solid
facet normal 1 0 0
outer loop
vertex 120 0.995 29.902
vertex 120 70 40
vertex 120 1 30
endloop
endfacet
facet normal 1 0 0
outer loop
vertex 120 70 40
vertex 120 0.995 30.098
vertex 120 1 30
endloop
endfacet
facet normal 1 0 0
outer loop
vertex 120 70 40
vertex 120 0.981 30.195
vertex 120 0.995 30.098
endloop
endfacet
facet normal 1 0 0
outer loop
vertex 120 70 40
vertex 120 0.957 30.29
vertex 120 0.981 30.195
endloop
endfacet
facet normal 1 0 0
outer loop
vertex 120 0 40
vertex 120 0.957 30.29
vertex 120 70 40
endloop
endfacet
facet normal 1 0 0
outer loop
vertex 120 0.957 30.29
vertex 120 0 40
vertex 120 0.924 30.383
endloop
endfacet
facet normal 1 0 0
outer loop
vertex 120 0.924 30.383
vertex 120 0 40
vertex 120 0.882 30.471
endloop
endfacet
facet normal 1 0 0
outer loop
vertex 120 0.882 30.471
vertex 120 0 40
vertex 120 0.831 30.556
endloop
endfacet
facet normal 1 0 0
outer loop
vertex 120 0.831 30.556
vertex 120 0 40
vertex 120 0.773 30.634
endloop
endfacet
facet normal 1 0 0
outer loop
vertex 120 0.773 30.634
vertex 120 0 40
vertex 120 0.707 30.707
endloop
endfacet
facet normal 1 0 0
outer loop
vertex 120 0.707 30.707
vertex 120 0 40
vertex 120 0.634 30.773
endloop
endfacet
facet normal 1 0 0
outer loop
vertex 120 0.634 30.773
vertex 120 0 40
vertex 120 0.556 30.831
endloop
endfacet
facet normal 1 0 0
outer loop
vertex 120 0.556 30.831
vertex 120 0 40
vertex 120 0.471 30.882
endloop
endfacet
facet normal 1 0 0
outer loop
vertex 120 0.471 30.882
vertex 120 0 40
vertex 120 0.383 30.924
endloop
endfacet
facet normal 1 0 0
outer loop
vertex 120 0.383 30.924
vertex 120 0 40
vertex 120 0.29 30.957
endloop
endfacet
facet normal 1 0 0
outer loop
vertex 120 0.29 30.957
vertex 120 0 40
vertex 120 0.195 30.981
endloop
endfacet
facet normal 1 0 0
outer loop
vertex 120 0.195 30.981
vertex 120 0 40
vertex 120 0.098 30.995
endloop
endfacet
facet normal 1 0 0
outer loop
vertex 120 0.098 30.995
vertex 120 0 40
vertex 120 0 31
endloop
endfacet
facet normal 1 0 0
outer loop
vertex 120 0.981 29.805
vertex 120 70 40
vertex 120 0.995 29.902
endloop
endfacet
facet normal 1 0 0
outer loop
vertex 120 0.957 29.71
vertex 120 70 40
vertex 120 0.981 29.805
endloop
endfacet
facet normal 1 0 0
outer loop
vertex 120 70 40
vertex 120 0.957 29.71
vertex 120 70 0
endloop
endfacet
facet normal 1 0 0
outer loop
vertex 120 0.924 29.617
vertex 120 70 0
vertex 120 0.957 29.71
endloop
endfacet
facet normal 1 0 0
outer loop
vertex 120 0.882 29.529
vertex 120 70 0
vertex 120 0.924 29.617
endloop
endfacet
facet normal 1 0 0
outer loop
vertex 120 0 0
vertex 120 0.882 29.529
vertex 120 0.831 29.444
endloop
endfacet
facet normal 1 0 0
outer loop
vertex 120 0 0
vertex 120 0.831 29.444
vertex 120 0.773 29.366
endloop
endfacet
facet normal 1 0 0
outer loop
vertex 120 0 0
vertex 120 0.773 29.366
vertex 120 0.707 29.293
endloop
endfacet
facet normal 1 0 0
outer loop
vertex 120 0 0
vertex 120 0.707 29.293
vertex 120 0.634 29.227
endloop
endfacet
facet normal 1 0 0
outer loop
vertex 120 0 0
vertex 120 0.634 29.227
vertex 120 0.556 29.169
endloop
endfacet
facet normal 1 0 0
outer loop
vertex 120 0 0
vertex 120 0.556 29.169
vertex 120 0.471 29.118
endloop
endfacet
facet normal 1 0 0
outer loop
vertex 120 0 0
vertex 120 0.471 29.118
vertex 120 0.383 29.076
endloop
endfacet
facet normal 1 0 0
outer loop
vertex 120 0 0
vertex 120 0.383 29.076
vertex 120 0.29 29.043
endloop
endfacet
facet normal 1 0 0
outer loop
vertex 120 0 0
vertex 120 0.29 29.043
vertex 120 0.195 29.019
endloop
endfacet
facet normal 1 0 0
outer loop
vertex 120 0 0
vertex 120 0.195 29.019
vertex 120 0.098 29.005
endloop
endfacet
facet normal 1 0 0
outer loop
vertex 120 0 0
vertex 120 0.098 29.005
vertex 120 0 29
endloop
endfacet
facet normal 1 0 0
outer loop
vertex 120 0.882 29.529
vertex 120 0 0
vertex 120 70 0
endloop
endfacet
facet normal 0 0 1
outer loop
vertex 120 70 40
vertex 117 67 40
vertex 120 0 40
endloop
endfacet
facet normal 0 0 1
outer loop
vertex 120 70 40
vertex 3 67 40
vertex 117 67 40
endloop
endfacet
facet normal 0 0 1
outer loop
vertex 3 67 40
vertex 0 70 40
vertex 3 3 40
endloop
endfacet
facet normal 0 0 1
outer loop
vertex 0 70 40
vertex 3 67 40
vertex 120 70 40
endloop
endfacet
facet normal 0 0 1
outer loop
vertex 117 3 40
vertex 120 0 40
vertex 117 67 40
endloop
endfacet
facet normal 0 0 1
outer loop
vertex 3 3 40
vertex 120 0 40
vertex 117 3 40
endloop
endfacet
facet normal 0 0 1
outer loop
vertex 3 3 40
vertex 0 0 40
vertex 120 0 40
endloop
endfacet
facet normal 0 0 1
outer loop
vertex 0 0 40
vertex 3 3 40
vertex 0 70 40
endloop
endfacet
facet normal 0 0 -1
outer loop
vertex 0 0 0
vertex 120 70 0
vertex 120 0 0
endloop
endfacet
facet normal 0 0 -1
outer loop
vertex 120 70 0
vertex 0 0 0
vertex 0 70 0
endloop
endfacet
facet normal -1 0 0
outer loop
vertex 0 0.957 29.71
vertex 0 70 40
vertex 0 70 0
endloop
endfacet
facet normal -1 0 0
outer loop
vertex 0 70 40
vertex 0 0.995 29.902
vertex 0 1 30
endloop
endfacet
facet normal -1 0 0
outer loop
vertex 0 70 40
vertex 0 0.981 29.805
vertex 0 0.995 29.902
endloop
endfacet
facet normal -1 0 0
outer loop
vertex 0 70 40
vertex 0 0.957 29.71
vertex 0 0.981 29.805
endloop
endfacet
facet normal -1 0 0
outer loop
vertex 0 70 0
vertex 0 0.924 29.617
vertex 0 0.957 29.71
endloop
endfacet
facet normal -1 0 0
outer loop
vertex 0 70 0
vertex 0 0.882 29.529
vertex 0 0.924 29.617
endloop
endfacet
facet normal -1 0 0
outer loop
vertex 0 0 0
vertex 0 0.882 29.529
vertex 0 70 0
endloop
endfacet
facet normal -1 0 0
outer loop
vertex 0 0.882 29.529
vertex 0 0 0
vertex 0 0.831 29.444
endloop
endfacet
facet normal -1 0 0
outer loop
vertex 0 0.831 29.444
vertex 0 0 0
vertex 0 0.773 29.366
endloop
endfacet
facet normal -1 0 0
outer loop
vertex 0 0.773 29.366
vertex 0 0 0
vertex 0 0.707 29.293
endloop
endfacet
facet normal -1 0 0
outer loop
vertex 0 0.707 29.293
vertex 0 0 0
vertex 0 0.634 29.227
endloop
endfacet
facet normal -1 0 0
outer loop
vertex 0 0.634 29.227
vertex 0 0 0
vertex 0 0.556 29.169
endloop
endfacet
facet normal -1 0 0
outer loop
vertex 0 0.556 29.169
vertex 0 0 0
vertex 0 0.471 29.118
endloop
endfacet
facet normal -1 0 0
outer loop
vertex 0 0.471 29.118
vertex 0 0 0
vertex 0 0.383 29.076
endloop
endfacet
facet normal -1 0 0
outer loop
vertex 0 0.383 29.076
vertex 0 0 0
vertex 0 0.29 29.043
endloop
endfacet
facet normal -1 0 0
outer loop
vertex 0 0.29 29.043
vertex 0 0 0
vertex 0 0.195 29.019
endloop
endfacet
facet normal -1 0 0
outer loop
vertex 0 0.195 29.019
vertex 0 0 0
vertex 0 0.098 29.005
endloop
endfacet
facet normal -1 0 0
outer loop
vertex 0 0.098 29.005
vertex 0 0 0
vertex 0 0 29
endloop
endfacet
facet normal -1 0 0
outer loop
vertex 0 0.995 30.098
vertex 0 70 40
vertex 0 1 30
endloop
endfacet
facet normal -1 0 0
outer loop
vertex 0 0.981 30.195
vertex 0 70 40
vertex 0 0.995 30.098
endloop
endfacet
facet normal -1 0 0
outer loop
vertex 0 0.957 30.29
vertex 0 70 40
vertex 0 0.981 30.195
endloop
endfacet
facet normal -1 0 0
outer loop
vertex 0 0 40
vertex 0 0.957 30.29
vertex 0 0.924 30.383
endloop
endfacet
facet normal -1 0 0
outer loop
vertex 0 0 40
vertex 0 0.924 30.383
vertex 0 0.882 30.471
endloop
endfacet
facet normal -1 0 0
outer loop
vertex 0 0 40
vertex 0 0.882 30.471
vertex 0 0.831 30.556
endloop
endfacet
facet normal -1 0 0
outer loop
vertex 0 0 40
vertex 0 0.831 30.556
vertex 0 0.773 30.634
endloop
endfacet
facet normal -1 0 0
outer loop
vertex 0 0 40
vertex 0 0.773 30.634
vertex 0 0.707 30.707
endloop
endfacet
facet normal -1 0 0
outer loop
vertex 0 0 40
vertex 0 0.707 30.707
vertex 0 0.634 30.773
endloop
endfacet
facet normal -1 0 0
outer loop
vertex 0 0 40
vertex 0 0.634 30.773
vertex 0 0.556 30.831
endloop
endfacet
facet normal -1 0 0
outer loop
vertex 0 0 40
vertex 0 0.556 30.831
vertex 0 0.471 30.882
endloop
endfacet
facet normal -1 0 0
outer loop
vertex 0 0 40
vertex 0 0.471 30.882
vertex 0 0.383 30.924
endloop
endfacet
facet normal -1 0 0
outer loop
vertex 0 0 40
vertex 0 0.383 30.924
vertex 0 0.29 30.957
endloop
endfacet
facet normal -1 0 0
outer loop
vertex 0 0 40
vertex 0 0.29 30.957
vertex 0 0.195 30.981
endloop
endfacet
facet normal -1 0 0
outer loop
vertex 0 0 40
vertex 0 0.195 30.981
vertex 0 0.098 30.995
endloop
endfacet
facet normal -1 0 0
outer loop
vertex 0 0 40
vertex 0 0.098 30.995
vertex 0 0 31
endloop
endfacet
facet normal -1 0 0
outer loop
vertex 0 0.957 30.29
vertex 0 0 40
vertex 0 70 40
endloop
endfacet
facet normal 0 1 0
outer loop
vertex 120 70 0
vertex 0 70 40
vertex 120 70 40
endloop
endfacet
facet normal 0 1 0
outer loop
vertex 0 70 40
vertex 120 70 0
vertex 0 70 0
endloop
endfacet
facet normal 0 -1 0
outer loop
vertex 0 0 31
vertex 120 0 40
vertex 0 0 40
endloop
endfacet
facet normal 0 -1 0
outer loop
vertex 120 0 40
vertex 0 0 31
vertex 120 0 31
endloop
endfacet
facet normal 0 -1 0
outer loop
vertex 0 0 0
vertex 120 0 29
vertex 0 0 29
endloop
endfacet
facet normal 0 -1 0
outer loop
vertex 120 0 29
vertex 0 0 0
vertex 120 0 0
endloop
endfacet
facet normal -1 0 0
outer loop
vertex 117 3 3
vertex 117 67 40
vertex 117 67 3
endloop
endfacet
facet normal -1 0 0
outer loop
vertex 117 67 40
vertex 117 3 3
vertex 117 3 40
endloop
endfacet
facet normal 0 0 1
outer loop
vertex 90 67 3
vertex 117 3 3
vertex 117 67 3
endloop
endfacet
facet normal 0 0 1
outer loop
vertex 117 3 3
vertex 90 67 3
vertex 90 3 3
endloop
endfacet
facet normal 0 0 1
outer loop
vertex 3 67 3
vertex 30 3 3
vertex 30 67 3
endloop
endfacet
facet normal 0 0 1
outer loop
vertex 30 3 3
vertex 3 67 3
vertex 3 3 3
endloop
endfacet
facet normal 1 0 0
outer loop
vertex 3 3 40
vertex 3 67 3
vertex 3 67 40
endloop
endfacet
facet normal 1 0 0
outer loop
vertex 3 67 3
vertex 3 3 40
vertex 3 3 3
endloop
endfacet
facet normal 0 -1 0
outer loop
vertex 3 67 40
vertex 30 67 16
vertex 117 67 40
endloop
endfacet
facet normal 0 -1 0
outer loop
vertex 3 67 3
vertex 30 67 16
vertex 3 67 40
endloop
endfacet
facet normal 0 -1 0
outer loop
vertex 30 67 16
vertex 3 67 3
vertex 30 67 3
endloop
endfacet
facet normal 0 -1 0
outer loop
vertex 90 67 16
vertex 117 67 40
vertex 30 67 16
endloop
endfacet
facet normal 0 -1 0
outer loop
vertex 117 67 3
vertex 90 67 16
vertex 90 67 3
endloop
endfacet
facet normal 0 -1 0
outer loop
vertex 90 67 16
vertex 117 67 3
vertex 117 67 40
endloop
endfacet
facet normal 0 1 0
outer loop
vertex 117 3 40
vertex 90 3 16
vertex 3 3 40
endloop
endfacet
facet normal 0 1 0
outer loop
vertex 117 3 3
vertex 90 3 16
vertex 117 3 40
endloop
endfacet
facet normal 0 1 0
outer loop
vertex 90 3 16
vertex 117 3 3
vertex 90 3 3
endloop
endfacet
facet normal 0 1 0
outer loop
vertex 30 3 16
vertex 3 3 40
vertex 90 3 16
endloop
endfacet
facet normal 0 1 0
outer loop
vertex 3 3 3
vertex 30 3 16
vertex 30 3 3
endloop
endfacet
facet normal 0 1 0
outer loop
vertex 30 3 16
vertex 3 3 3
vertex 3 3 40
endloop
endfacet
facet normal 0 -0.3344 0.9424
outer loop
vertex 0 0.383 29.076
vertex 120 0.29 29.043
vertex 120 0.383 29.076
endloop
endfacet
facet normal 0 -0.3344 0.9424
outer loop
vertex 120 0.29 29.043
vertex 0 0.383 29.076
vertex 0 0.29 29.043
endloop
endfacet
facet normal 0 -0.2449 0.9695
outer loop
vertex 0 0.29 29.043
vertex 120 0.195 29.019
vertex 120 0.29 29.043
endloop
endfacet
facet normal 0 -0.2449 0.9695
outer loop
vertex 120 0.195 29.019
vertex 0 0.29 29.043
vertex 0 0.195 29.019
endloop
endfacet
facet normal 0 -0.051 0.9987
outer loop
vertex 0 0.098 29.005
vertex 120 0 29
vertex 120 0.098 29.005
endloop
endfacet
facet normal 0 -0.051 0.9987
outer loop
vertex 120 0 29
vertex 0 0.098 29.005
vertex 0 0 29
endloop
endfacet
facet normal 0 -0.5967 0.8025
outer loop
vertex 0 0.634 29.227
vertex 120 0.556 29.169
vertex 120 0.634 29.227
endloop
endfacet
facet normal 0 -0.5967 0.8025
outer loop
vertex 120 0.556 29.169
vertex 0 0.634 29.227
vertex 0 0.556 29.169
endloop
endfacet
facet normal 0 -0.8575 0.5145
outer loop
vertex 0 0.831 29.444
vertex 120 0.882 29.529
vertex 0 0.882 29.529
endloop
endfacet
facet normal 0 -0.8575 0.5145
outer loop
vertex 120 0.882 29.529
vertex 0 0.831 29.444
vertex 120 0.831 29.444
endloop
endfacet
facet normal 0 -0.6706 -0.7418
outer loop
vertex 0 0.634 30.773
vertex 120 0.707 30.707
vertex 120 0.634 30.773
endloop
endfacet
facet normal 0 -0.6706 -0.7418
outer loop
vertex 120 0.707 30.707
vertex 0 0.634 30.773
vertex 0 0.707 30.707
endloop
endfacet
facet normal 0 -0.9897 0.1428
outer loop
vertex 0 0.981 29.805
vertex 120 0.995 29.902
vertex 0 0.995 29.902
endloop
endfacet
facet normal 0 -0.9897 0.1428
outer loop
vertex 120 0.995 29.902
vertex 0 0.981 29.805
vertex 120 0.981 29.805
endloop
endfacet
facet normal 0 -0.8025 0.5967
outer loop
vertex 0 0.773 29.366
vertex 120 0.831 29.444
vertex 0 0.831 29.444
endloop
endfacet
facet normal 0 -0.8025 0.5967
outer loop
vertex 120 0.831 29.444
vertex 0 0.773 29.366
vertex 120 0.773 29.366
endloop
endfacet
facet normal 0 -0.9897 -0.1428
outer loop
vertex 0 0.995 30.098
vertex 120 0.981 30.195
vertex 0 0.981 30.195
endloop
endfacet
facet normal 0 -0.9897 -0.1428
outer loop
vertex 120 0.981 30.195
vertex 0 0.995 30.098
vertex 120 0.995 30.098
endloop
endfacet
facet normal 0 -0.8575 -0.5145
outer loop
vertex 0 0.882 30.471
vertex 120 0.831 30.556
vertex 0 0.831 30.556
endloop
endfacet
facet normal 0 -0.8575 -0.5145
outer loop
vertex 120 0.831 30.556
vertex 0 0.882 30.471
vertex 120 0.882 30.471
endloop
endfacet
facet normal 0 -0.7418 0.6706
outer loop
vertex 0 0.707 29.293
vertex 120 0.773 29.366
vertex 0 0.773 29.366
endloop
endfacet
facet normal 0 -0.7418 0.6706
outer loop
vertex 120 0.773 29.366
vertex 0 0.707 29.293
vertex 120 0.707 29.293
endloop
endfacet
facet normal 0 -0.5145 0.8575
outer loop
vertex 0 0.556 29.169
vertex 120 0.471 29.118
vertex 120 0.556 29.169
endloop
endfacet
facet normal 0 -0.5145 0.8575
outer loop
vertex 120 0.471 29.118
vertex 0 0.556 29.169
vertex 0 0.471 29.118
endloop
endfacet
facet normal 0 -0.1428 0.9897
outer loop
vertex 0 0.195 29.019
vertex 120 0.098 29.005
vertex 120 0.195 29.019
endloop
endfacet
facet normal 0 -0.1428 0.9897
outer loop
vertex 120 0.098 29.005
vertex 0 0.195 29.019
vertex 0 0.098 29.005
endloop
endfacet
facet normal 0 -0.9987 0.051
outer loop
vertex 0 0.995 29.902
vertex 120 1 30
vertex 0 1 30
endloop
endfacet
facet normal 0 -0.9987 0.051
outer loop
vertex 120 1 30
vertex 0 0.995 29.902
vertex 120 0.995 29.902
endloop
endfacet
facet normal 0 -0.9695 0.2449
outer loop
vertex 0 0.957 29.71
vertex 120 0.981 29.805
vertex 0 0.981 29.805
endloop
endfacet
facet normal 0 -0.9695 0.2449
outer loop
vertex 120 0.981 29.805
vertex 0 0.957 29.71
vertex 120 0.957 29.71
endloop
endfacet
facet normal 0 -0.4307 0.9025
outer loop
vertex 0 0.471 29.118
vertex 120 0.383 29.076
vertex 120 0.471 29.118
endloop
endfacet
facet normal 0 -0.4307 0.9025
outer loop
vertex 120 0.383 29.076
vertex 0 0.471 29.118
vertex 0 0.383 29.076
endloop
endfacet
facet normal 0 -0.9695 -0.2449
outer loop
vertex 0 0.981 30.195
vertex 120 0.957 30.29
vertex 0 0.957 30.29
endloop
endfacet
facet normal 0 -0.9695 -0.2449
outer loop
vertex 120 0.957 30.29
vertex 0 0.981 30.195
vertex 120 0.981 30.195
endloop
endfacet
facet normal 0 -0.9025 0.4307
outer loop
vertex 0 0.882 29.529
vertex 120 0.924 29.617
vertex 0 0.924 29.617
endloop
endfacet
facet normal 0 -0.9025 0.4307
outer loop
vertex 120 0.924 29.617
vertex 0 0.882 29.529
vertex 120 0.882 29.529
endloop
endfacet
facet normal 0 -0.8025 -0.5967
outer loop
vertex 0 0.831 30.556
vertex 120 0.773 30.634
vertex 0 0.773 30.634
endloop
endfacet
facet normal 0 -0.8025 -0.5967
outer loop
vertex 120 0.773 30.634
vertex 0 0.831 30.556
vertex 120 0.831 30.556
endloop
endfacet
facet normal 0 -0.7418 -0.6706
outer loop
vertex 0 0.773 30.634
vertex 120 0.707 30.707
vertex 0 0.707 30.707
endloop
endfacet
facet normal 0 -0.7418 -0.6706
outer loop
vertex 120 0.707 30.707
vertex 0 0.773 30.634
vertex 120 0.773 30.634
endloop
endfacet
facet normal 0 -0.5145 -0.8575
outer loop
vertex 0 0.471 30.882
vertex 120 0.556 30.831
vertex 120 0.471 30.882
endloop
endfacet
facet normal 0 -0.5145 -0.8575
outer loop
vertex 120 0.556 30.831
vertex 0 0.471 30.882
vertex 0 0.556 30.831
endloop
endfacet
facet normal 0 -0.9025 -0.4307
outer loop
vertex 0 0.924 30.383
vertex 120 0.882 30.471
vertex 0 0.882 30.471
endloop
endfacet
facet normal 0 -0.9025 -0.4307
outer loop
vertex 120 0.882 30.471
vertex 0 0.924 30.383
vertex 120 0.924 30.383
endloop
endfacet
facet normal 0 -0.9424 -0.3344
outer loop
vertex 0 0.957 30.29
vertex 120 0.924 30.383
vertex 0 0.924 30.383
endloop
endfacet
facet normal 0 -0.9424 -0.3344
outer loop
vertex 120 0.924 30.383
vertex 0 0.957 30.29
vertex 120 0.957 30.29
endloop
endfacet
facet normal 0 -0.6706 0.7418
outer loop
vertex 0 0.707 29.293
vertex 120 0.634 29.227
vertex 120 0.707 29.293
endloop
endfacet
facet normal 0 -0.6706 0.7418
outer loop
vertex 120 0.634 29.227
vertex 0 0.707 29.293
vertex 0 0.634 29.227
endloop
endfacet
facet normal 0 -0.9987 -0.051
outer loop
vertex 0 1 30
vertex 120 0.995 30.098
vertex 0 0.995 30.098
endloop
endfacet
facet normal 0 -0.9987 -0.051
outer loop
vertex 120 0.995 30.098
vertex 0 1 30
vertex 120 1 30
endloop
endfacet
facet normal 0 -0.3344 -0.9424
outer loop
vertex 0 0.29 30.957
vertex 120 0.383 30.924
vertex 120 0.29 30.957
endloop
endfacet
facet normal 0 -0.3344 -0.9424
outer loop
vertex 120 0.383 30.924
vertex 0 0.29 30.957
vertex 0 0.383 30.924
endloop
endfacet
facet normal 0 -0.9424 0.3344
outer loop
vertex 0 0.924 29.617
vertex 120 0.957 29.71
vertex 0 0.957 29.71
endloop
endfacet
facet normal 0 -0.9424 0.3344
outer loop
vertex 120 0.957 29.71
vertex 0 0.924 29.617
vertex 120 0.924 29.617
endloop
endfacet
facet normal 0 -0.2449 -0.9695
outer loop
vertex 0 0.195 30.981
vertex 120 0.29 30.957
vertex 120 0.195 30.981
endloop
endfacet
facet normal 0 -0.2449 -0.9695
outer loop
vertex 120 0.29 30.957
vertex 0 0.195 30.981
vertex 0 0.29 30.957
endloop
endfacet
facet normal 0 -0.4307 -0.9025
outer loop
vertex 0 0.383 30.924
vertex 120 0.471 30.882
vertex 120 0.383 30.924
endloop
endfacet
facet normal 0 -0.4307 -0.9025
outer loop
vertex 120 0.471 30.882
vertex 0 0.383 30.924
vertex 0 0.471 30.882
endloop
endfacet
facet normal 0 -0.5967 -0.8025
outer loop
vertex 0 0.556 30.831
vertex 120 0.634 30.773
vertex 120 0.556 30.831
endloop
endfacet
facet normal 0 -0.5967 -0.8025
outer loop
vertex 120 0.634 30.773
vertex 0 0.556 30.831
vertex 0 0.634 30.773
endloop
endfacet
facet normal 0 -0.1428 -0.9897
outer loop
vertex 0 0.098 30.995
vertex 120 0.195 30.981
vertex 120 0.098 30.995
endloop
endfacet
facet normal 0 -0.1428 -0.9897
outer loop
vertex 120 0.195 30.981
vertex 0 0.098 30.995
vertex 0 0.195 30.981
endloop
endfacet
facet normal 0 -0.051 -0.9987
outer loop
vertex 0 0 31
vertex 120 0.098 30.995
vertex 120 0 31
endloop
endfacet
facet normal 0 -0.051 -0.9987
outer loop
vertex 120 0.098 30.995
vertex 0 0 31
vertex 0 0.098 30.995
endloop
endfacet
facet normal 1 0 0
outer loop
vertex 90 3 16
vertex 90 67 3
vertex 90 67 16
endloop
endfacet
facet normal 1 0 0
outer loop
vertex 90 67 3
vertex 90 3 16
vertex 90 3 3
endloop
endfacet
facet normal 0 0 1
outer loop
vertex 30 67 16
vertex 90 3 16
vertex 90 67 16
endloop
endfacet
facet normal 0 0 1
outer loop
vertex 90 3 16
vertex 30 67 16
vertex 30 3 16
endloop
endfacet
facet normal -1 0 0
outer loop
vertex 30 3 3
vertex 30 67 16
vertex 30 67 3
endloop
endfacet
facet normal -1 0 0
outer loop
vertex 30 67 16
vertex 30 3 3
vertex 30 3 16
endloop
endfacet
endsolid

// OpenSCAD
// --- Parameters ---
// Outer dimensions of the tank
outer_x = 120; // Length of the tank (X)
outer_y = 70;  // Width of the tank (Y)
outer_z = 40;  // Height of the tank (Z)

// Wall and floor thickness
wall_thickness = 3; 
floor_thickness = 3;

// Platform dimensions
platform_length = 60; // Length of the platform along X
platform_height_from_inner_floor = 10; // Height of platform top relative to inner floor

// Electrode holes
hole_diameter = 2;
hole_y_pos = 0; // Y position of the hole center
hole_z_pos = 30; // Z position of the hole center

// Resolution
$fn = 64;

// --- Calculations ---
inner_x = outer_x - (2 * wall_thickness);
inner_y = outer_y - (2 * wall_thickness);
inner_z = outer_z - floor_thickness;

// The platform top is 10mm above the inner floor.
// Inner floor is at z = floor_thickness.
platform_top_z = floor_thickness + platform_height_from_inner_floor;

// --- Modeling ---

module buffer_tank() {
    difference() {
        // Main Body
        cube([outer_x, outer_y, outer_z]);

        // Hollow out the tank
        translate([wall_thickness, wall_thickness, floor_thickness])
            cube([inner_x, inner_y, outer_z]);

        // Electrode holes (drilled through the X-end walls)
        // We use a cylinder oriented along X. 
        // To ensure clean cuts, we make the cylinder longer than the tank.
        translate([-1, hole_y_pos, hole_z_pos])
            rotate([0, 90, 0])
                cylinder(d = hole_diameter, h = outer_x + 2);
    }

    // The Platform
    // It spans the full inner width (Y) and is 60mm long (X), centered.
    // It sits on the floor.
    translate([
        (outer_x - platform_length) / 2, 
        wall_thickness, 
        floor_thickness
    ])
    cube([platform_length, inner_y, platform_top_z]);
}

// Render the part
buffer_tank();
